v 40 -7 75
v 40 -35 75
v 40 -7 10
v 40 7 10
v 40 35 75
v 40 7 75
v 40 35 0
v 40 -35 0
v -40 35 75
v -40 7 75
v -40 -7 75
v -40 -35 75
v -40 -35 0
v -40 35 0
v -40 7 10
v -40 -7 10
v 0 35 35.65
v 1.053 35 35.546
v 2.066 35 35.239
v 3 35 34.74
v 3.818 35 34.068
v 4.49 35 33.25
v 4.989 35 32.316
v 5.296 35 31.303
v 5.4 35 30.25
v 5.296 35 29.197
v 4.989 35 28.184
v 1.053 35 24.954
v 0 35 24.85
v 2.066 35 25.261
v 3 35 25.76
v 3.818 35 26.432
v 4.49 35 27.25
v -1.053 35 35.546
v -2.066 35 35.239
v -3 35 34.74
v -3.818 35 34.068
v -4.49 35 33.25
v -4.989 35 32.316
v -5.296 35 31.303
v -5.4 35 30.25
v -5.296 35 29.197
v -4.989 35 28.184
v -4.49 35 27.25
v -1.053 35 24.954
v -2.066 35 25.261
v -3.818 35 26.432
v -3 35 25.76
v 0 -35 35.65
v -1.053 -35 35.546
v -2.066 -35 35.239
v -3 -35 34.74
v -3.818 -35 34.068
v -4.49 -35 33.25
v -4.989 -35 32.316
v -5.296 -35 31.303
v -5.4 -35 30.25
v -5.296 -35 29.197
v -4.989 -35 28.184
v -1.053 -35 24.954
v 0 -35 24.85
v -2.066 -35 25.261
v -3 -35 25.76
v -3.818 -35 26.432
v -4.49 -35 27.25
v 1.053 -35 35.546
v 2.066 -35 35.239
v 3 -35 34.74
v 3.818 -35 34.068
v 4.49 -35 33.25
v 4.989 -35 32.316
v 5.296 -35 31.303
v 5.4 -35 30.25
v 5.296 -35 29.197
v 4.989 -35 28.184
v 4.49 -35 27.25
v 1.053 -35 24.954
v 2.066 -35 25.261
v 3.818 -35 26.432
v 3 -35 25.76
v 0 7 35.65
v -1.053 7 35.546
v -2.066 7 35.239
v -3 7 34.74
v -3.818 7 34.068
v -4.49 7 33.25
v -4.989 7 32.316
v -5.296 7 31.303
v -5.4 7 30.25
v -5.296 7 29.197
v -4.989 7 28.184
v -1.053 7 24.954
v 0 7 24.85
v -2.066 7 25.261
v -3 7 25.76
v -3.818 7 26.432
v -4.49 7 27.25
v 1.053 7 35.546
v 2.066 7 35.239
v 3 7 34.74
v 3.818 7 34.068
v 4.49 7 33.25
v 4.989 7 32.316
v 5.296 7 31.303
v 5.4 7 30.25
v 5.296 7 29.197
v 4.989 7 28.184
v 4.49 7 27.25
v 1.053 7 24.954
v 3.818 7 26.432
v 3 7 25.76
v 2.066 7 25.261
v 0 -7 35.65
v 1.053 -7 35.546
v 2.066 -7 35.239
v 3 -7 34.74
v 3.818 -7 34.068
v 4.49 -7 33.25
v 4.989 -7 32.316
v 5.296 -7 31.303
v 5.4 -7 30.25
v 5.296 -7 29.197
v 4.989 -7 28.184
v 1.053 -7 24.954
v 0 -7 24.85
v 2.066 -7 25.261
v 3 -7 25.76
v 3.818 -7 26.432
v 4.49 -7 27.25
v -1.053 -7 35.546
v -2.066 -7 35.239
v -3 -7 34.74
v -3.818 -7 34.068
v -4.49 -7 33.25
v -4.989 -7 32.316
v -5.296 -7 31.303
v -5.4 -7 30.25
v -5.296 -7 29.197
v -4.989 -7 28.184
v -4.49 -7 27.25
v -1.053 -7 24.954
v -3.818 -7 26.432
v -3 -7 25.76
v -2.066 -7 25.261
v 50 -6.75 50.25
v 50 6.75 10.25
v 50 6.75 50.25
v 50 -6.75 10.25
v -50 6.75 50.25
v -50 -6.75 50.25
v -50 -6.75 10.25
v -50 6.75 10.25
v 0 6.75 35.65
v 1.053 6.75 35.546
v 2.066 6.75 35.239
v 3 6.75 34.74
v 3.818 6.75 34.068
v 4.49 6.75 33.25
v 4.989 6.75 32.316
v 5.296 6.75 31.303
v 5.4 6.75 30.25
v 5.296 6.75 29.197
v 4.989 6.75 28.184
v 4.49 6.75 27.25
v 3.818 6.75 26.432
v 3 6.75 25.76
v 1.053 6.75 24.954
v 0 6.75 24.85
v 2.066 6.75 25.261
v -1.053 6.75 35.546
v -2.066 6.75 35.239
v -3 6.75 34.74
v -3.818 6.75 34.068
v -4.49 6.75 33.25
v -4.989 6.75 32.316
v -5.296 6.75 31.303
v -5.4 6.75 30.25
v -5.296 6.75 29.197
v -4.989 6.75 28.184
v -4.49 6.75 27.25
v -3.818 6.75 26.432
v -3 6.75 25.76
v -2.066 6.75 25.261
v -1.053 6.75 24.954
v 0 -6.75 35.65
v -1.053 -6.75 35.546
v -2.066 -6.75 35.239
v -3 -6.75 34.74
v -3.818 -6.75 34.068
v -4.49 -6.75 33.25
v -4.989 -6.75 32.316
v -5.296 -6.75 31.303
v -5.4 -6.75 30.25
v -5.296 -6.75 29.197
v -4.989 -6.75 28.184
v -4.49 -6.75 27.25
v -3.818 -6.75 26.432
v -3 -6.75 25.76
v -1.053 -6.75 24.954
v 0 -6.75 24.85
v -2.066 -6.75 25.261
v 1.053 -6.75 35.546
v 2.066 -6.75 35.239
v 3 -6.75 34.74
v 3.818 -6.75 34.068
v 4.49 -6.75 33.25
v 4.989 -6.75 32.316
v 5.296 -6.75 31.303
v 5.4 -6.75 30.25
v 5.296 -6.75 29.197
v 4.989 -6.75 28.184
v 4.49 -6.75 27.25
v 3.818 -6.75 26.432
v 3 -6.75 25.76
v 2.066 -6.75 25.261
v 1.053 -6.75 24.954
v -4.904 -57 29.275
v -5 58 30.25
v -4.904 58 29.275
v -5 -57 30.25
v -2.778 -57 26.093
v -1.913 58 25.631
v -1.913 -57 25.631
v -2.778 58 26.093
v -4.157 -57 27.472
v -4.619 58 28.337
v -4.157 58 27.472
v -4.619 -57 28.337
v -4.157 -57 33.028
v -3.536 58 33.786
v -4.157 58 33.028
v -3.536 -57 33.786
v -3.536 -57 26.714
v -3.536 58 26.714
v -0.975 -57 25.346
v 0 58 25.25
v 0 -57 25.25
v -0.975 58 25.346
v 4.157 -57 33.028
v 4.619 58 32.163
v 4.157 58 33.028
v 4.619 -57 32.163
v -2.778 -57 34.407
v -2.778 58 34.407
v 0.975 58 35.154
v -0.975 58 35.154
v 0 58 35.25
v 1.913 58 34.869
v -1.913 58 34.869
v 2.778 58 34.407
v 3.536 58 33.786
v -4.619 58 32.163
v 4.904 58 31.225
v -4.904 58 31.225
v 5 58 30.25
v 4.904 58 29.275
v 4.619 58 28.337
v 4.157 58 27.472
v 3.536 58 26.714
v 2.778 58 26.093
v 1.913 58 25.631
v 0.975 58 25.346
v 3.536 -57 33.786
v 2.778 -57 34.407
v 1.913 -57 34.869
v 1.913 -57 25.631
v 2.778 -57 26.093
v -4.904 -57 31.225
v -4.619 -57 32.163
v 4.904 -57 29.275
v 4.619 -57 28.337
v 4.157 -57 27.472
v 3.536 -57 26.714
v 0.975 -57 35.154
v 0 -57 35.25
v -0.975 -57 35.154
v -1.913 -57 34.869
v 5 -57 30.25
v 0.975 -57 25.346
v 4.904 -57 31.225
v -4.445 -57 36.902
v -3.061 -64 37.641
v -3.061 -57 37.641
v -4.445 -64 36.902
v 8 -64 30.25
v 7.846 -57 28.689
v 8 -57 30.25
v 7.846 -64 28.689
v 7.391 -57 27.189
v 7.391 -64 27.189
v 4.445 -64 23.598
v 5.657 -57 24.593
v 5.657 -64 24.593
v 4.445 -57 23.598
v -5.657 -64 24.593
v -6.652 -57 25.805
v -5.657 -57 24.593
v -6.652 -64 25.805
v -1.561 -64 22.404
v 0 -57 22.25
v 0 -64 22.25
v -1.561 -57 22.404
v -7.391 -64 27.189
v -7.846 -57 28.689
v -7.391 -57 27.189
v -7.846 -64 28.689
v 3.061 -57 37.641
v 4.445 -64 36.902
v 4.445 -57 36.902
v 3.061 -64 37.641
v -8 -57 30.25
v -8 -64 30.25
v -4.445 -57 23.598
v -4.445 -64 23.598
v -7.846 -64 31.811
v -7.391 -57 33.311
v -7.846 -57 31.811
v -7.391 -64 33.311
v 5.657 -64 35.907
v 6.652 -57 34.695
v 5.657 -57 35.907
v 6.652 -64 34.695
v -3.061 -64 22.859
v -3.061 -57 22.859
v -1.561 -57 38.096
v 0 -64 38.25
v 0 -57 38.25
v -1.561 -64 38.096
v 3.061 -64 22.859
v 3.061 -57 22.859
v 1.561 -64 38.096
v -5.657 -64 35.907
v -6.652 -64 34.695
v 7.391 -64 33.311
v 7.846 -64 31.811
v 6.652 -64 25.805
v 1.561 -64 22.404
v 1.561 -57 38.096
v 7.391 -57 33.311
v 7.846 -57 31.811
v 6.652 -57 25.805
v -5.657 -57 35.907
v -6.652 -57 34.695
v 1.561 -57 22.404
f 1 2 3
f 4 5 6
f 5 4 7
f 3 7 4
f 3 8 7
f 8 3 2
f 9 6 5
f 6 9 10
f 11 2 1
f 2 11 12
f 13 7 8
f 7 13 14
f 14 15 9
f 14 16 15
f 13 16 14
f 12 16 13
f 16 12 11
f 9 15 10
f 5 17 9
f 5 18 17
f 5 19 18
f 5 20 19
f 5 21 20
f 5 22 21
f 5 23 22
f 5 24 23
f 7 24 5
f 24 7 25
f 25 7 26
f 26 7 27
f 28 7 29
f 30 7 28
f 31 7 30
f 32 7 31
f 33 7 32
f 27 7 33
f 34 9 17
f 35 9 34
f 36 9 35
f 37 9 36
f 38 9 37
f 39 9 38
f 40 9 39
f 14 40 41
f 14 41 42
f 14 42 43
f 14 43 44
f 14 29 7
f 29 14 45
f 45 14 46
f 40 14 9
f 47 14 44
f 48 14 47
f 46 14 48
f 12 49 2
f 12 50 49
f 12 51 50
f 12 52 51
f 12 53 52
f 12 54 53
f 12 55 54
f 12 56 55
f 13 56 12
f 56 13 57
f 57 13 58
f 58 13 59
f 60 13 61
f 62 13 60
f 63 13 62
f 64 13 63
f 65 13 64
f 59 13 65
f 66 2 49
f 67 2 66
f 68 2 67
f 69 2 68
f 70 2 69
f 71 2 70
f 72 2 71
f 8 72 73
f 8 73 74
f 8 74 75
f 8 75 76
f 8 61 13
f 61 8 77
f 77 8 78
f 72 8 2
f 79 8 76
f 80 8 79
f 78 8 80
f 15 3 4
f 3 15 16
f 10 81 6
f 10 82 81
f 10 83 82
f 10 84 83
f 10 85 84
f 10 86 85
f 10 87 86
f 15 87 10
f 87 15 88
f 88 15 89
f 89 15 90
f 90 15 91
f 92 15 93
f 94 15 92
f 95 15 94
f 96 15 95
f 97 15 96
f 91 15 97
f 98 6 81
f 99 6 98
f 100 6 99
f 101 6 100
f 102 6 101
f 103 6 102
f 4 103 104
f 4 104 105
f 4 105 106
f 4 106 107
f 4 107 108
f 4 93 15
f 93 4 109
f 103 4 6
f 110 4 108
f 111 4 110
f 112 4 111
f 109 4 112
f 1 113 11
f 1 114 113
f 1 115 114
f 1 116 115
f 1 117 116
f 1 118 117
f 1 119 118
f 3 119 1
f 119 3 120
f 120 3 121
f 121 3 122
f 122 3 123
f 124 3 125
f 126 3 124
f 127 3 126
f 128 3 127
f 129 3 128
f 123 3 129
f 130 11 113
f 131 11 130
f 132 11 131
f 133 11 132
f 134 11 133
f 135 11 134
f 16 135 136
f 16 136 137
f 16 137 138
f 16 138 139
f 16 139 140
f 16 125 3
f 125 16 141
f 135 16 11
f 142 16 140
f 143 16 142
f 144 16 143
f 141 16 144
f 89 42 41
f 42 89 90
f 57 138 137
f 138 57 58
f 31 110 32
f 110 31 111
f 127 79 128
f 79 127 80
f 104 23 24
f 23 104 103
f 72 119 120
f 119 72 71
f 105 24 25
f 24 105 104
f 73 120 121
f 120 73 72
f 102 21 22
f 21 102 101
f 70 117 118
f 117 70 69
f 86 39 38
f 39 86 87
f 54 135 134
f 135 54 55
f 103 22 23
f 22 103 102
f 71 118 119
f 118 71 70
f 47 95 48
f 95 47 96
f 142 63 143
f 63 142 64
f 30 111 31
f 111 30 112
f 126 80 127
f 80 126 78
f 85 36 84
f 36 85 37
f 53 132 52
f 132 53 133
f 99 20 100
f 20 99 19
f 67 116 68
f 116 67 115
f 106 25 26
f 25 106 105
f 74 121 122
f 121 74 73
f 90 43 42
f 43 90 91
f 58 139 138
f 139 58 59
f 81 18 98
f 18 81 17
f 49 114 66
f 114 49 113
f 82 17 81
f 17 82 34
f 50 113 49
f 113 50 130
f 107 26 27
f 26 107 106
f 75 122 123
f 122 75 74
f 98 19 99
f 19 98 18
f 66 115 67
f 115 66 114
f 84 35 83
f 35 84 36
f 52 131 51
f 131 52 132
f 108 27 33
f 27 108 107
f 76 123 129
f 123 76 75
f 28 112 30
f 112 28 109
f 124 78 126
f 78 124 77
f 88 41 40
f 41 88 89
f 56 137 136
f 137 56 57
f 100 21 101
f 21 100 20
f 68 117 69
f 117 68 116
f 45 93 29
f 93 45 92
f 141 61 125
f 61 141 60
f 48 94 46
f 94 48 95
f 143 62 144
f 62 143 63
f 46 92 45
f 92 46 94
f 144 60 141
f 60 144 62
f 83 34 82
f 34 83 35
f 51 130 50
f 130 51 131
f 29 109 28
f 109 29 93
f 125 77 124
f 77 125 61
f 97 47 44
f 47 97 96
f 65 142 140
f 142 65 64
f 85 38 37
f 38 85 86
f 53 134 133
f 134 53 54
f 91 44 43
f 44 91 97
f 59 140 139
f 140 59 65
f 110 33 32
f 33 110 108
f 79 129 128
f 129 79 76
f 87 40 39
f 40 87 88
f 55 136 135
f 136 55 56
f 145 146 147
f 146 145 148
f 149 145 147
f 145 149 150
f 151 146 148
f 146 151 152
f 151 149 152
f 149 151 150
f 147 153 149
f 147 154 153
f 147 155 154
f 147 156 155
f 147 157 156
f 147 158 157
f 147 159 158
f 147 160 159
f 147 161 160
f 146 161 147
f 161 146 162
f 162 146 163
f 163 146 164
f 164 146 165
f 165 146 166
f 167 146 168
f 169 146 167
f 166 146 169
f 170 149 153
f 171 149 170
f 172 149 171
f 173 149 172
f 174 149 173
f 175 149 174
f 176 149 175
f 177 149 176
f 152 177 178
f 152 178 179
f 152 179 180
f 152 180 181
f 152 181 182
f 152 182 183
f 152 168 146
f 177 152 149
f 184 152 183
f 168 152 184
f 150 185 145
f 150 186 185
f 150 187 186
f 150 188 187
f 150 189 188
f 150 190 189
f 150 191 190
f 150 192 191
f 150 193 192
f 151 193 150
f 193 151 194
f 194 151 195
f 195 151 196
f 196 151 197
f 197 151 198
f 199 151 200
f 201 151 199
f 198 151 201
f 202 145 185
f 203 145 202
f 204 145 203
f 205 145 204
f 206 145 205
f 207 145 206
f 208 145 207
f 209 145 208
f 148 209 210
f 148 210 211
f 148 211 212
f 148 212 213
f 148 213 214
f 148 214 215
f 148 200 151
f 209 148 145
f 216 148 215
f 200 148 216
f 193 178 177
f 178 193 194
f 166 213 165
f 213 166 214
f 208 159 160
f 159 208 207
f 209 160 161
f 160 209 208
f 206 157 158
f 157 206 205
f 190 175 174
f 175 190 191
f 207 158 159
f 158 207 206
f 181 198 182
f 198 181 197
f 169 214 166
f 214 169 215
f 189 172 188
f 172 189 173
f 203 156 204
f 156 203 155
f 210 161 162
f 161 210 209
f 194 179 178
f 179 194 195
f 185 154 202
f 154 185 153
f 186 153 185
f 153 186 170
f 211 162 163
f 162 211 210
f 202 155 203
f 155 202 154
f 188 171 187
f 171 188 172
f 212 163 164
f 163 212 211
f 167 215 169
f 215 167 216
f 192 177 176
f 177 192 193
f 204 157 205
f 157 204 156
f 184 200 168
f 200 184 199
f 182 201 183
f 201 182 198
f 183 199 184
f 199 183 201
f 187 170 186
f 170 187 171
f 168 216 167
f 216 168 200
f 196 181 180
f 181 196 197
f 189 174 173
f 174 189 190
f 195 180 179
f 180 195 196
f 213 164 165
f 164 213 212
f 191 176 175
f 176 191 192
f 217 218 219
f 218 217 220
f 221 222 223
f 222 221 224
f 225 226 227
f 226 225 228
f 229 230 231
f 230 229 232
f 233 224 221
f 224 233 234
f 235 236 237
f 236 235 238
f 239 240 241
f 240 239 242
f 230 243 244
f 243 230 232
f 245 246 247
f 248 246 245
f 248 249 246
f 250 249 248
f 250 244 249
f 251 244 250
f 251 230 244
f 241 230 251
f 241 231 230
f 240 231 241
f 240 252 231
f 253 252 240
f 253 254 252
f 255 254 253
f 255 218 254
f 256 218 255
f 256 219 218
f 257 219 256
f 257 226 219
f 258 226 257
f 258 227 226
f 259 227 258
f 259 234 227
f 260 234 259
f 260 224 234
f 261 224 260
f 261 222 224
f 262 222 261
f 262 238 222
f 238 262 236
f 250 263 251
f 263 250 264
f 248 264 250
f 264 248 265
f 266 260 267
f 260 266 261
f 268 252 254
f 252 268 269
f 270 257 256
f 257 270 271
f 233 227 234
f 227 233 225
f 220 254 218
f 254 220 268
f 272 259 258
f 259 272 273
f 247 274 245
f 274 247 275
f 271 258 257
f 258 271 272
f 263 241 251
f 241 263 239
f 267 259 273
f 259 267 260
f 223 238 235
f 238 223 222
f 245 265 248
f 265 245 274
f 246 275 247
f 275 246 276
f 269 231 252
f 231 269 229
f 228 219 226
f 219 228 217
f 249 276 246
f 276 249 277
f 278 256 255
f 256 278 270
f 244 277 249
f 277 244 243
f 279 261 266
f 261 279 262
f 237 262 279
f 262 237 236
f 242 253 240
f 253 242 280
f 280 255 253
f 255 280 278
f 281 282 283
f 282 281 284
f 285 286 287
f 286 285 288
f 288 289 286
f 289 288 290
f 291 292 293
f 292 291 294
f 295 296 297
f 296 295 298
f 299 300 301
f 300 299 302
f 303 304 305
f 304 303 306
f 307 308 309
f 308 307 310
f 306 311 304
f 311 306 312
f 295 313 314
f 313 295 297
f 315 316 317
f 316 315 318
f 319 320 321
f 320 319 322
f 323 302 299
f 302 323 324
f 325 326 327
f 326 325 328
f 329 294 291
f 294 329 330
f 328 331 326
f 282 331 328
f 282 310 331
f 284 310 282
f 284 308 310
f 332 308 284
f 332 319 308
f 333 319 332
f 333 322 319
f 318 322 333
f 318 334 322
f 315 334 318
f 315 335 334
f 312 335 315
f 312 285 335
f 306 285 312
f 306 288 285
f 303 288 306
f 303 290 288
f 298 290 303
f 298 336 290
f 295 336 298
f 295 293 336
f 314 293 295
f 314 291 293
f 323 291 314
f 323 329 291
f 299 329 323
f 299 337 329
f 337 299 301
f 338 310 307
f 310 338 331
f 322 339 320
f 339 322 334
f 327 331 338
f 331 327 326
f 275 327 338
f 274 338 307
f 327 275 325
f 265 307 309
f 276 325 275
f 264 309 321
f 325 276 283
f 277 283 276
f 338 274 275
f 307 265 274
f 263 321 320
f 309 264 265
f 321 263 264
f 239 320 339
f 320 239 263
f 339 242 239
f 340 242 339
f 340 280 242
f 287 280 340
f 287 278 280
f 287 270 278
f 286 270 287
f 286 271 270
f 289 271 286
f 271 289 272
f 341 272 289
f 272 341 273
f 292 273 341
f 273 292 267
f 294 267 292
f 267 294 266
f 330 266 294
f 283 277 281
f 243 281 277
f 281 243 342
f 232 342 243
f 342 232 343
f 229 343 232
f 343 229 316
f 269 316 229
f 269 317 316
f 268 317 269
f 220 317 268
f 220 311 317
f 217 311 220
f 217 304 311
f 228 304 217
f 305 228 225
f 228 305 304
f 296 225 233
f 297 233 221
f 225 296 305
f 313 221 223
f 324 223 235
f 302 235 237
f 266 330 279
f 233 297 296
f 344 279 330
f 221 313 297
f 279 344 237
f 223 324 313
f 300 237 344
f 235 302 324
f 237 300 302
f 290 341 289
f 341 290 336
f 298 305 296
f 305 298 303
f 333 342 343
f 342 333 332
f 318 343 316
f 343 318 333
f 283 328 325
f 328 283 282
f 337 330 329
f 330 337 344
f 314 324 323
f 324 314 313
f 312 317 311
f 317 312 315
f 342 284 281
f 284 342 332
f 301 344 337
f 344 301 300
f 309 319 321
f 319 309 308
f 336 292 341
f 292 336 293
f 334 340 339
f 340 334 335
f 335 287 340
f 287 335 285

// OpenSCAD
$fn = 32;

// ------------------------------------------------------------------------
// Clevis joint: 80 mm clevis, pin d10
// Every part is its own module, assembly() places them once.
// ------------------------------------------------------------------------

// --- part 1 ---
module clevis() {
  difference() {
    translate([-40, -35, 0]) cube([80, 70, 75]);
    translate([-41, -7, 10]) cube([82, 14, 66]);
    translate([0, 0, 30.25]) rotate([90, 0, 0]) cylinder(h = 72, d = 10.8, center = true);
  }
}

// --- part 2 ---
module eye() {
  difference() {
    translate([-50, -6.75, 0]) cube([100, 13.5, 40]);
    translate([0, 0, 20]) rotate([90, 0, 0]) cylinder(h = 15.5, d = 10.8, center = true);
  }
}

// --- part 3 ---
module pin() {
  rotate([0, 90, 0]) cylinder(h = 116, d = 10, center = true);
  translate([-64, 0, 0]) rotate([0, 90, 0]) cylinder(h = 7, d = 16);
}

// --- assembly ---
module assembly() {
  translate([0, 0, 0]) rotate([0, 0, 0]) clevis();
  translate([0, 0, 10.25]) rotate([0, 0, 0]) eye();
  translate([0, 0, 30.25]) rotate([0, 0, 90]) pin();
}

assembly();
